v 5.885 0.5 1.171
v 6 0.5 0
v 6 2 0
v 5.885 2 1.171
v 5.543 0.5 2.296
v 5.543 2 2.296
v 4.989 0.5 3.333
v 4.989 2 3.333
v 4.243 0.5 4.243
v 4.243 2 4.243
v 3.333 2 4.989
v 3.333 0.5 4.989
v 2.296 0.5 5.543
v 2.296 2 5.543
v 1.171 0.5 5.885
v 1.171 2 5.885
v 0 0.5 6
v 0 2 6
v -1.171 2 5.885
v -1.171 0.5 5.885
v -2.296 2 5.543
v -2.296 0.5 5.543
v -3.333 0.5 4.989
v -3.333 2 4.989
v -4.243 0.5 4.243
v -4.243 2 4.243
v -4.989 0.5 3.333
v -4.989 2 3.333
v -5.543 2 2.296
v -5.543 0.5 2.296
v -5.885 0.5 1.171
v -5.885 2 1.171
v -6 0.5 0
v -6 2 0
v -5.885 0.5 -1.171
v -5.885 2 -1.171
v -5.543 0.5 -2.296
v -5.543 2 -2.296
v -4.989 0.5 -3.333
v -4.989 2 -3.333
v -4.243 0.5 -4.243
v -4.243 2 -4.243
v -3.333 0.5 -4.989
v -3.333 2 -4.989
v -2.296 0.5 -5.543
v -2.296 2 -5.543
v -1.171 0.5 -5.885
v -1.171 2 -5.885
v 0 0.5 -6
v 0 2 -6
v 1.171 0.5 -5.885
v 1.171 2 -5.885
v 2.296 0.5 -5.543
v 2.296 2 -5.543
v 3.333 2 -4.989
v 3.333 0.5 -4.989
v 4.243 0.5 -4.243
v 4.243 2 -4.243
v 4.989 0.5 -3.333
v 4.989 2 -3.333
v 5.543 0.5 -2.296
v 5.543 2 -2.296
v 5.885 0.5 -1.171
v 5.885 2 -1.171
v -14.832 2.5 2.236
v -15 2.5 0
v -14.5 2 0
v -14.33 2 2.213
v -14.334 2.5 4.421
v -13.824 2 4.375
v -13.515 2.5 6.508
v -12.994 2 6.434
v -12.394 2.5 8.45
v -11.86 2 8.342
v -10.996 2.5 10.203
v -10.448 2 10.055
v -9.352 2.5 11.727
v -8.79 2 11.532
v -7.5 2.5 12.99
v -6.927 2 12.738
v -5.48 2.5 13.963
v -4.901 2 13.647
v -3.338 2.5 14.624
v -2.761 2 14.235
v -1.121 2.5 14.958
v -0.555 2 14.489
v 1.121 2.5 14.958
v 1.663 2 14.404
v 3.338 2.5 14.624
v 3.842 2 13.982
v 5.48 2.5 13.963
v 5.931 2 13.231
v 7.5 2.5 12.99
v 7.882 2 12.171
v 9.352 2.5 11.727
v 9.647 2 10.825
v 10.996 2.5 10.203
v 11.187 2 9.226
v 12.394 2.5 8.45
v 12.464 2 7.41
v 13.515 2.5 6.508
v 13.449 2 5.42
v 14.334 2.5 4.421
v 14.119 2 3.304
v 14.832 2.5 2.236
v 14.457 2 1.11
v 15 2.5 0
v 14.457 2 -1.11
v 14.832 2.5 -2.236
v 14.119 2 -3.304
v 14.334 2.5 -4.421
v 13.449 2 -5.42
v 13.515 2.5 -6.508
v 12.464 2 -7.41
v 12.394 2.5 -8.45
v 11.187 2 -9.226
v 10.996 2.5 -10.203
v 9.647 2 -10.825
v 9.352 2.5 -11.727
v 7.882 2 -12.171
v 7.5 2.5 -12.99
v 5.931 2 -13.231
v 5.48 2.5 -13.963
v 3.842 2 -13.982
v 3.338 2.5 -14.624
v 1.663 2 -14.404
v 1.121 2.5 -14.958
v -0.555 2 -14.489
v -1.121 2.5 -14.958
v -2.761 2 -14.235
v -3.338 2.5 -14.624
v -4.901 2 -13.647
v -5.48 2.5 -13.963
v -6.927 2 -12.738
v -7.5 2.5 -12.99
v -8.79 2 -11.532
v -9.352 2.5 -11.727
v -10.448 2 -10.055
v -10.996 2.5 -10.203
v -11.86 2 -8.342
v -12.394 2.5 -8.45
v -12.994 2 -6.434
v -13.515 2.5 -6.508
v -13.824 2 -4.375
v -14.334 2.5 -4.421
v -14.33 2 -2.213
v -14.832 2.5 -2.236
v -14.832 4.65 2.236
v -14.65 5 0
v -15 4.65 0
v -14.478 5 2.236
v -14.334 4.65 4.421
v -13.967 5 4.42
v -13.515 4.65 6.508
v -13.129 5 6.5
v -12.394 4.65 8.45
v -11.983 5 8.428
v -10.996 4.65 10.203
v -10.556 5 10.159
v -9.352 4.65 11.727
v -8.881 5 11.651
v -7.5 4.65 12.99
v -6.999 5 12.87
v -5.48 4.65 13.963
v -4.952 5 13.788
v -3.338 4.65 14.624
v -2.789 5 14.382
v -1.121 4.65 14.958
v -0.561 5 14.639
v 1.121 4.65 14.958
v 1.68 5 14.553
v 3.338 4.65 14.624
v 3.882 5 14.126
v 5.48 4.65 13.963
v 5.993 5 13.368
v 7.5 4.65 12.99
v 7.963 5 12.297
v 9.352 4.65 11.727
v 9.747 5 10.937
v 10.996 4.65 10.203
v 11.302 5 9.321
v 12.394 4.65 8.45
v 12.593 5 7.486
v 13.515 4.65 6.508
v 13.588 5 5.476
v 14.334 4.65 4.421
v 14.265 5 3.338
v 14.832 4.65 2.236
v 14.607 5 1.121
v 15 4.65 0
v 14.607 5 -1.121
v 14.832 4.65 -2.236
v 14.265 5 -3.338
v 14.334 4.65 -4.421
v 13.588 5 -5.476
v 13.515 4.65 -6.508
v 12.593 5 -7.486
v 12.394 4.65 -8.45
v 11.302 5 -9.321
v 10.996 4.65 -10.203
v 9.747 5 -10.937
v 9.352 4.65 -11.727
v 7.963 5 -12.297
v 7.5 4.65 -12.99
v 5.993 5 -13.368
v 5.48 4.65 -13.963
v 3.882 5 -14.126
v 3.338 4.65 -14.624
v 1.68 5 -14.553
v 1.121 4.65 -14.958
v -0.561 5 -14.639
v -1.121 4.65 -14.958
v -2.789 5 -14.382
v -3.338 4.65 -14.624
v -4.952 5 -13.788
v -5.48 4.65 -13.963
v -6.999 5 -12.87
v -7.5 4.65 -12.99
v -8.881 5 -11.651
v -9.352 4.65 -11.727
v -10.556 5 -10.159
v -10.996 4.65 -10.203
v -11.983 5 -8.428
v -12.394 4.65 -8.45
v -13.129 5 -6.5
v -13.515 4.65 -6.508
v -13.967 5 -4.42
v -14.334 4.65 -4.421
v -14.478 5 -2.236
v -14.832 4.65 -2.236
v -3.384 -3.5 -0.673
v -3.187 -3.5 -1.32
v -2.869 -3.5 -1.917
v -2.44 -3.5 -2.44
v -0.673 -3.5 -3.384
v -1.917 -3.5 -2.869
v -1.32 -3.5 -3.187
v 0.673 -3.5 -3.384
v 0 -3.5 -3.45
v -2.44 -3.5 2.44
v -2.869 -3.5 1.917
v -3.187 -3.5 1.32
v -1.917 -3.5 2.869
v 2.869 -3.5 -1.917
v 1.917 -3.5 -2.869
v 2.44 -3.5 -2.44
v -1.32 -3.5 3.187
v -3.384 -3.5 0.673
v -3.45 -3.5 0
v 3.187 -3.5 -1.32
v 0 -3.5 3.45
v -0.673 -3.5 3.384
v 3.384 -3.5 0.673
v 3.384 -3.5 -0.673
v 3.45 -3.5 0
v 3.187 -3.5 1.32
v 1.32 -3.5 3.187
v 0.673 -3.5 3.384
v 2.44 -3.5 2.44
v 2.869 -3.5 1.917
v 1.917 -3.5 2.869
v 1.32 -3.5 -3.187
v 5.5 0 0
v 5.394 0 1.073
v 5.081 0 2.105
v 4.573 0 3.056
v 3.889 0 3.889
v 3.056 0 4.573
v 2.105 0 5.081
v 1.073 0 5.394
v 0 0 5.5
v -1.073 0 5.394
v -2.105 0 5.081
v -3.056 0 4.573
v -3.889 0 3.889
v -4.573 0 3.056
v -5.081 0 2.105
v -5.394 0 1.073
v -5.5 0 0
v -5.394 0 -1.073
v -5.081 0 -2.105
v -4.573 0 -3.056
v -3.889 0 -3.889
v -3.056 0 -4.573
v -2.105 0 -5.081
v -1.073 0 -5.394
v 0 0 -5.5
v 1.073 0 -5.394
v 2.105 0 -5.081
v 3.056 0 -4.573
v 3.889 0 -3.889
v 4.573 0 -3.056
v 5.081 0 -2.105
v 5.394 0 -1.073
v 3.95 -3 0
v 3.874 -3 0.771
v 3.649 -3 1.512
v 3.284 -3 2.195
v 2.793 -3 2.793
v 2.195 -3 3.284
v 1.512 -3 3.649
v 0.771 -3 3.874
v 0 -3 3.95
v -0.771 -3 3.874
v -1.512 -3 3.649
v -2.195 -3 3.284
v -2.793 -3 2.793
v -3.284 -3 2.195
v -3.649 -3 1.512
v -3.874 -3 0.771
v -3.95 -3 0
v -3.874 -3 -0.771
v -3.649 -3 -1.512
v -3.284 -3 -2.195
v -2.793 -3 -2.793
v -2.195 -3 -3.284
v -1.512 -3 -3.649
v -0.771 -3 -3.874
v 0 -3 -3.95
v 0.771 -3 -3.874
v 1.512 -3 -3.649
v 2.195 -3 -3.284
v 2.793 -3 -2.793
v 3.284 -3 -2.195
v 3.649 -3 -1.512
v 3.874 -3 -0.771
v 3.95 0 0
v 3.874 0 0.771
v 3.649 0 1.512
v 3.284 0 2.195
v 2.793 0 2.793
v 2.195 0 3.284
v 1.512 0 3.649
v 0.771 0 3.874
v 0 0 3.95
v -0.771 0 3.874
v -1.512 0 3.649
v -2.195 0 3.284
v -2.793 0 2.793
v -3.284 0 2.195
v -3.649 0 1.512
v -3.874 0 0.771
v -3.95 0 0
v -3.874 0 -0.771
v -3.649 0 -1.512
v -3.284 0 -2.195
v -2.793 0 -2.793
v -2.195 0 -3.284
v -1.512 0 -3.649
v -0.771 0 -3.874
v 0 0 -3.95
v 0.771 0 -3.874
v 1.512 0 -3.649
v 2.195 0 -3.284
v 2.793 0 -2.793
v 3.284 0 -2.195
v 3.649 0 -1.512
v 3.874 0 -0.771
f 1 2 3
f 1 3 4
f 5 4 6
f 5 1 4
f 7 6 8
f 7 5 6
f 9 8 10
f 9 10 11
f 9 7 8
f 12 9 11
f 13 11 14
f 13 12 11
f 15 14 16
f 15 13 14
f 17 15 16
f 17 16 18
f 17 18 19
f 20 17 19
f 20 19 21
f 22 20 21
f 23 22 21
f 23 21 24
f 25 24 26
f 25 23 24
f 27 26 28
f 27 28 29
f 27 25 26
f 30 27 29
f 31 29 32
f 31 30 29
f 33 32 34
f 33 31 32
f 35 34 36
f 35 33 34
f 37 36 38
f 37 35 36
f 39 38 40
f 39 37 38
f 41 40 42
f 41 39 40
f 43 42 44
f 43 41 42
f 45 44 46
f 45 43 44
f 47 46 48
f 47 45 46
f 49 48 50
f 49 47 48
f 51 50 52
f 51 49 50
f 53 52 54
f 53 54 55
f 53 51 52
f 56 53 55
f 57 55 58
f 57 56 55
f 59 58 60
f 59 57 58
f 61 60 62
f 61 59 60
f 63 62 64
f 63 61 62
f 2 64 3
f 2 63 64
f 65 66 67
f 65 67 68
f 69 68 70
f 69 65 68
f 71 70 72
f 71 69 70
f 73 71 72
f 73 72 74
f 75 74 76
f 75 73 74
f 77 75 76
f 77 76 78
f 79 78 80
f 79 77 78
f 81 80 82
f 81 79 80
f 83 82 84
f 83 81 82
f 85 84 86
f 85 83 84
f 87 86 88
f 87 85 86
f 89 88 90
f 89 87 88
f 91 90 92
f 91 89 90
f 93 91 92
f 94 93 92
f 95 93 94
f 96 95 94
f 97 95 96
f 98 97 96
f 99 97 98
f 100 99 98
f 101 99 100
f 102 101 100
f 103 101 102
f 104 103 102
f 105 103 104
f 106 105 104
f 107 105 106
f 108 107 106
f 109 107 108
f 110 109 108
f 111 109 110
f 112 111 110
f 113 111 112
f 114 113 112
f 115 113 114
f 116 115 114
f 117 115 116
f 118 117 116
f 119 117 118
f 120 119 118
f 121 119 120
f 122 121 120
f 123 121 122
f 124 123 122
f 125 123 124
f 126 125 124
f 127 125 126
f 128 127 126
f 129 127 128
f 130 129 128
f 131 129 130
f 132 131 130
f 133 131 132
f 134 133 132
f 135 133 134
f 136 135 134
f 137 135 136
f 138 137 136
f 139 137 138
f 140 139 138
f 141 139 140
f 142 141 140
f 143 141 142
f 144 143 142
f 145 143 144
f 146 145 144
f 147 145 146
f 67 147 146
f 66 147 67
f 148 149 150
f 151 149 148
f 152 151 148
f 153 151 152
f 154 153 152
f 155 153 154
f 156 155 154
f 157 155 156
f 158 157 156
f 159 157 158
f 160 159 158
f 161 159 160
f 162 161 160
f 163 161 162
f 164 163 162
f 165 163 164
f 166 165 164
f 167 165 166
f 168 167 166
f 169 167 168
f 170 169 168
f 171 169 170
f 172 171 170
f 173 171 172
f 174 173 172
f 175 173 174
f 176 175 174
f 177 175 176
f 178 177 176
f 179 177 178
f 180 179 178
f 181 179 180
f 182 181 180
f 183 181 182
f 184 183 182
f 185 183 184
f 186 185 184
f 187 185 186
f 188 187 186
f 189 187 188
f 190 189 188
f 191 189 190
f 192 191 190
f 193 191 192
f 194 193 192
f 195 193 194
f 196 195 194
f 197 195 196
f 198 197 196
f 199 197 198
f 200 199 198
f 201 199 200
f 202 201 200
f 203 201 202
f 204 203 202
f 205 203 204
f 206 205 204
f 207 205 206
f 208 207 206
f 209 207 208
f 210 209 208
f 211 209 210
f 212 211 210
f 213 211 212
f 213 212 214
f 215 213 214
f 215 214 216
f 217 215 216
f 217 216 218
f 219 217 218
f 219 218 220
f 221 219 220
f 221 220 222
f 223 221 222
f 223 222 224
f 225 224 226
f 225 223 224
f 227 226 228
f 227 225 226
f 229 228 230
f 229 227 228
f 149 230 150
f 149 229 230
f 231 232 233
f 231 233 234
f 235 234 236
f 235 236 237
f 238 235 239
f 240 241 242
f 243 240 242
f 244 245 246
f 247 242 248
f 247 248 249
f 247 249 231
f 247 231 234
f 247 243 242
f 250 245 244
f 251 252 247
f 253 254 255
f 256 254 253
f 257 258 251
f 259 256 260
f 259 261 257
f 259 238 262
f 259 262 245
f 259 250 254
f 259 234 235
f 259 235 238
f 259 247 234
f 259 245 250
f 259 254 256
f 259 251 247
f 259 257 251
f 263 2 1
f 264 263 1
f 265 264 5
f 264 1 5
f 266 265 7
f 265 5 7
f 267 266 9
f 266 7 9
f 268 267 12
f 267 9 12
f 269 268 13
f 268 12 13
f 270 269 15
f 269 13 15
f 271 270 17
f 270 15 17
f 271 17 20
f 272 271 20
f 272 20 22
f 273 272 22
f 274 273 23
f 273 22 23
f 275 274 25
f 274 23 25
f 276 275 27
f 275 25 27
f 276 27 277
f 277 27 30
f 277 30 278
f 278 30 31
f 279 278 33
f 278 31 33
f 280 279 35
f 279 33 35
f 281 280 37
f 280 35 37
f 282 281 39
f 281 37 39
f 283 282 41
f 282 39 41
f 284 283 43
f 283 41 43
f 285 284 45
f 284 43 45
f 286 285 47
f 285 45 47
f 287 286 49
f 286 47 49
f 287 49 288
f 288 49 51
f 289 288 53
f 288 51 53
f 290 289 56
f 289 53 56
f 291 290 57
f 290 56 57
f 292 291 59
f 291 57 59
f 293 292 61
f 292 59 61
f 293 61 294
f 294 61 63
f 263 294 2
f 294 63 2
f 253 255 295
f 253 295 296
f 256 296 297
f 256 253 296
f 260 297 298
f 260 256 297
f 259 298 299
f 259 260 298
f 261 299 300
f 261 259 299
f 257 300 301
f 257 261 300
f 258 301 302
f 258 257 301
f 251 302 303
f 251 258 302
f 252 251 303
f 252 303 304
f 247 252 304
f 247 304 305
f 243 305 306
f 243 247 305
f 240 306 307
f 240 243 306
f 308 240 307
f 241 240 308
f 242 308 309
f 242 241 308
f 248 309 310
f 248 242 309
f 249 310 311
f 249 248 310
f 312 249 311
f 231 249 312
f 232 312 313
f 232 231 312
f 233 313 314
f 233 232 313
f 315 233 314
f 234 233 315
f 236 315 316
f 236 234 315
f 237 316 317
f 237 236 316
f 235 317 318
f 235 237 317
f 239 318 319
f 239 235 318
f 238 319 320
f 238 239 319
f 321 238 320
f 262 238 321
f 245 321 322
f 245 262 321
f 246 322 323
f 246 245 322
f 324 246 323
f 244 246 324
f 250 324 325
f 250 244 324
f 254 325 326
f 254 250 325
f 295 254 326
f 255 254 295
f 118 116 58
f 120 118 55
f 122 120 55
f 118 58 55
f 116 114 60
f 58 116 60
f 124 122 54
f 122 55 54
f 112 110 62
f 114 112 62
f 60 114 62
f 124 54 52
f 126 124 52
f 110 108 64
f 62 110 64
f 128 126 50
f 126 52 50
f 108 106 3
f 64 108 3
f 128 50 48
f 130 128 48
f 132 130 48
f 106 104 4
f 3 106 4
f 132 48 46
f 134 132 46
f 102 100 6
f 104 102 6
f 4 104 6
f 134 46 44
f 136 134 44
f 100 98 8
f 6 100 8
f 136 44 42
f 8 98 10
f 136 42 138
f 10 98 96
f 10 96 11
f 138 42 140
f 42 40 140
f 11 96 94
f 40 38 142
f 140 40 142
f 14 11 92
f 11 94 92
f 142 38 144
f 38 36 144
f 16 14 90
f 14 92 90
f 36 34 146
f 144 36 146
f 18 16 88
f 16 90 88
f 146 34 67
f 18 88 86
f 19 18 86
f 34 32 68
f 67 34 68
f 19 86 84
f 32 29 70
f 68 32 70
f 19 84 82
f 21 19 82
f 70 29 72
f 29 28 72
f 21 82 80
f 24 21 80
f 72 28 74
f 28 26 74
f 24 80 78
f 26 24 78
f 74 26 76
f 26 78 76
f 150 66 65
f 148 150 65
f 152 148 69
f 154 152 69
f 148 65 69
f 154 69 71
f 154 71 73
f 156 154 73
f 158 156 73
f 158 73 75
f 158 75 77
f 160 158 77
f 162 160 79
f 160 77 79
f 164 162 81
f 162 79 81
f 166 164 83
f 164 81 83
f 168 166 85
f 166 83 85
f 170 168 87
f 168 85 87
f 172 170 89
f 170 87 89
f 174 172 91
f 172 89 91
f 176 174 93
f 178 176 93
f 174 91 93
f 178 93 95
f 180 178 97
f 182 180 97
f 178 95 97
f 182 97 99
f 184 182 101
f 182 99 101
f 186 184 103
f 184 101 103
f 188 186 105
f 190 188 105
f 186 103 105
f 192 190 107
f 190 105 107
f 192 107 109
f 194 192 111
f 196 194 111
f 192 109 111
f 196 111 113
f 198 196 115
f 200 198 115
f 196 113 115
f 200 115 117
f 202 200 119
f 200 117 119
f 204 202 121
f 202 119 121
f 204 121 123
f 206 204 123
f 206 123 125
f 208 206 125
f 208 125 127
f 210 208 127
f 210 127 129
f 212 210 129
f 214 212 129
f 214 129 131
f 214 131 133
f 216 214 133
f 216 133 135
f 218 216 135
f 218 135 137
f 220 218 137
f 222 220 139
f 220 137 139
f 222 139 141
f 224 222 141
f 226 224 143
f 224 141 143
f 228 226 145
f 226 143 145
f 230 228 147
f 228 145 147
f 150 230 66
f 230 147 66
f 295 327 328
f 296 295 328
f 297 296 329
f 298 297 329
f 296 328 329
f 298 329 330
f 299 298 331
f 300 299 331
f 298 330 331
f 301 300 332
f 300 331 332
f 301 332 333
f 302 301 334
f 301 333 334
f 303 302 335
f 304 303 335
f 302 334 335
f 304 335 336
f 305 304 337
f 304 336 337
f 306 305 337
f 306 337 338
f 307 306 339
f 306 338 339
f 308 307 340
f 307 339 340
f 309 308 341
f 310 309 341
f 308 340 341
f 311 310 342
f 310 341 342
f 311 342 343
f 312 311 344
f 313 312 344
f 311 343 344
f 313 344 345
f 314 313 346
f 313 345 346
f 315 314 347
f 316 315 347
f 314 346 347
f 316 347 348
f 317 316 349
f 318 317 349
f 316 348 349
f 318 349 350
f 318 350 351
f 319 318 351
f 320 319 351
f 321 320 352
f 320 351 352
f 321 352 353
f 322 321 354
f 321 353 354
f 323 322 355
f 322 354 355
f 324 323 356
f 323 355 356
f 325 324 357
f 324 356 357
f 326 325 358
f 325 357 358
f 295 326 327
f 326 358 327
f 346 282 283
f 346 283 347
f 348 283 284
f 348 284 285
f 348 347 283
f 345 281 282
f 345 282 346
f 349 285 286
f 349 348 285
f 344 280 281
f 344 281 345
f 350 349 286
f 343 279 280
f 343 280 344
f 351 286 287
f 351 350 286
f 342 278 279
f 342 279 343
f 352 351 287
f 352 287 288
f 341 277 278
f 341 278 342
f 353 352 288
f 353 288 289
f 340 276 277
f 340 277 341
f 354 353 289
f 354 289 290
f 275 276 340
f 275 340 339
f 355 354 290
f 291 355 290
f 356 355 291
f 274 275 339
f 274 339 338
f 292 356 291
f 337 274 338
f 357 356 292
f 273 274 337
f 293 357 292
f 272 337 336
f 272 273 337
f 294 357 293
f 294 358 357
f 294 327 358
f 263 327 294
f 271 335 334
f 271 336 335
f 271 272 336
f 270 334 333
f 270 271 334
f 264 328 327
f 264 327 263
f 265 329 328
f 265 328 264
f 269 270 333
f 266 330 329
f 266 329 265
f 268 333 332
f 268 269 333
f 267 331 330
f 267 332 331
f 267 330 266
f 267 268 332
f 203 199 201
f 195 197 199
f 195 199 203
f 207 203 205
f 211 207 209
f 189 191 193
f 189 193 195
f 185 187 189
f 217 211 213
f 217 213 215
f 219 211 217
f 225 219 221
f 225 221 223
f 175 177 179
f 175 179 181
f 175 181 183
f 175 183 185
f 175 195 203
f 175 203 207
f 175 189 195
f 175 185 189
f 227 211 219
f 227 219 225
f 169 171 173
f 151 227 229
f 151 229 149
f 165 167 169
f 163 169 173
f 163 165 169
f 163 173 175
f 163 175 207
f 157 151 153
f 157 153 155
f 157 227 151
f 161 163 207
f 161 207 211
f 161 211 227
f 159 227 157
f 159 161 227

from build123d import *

# Parameters (mm, degrees)
F0_R     = 3.95
F1_DEPTH = 3.5
F2_R     = 6
F3_DEPTH = 2
F4_R     = 15
F5_DEPTH = 3
F6_SIZE  = 0.5
F7_SIZE  = 0.5
F8_SIZE2 = 0.35
F8_SIZE  = 0.35


with BuildPart() as f1:
    # F0 (on Front) → F1 (new body)
    with BuildSketch(Plane.XZ):
        Circle(F0_R)
    extrude(amount=F1_DEPTH)

    # F2 (on Front) → F3 (join)
    with BuildSketch(Plane.XZ):
        Circle(F2_R)
    extrude(amount=-F3_DEPTH)

    # F4 (on face) → F5 (join)
    with BuildSketch(Plane(origin=(0, 2, 0), x_dir=(-1, 0, 0), z_dir=(0, 1, 0))):
        Circle(F4_R)
    extrude(amount=F5_DEPTH)

    # F6
    f6_edges = [f1.edges().sort_by_distance(p)[0] for p in [
        (-3.95, -3.5, 0),
    ]]
    chamfer(f6_edges, length=F6_SIZE)

    # F7
    f7_edges = [f1.edges().sort_by_distance(p)[0] for p in [
        (-6, 0, 0),
        (15, 2, 0),
    ]]
    chamfer(f7_edges, length=F7_SIZE)

    # F8
    f8_edges = [f1.edges().sort_by_distance(p)[0] for p in [
        (15, 5, 0),
    ]]
    chamfer(f8_edges, length=F8_SIZE, length2=F8_SIZE2)


solid = f1.part
